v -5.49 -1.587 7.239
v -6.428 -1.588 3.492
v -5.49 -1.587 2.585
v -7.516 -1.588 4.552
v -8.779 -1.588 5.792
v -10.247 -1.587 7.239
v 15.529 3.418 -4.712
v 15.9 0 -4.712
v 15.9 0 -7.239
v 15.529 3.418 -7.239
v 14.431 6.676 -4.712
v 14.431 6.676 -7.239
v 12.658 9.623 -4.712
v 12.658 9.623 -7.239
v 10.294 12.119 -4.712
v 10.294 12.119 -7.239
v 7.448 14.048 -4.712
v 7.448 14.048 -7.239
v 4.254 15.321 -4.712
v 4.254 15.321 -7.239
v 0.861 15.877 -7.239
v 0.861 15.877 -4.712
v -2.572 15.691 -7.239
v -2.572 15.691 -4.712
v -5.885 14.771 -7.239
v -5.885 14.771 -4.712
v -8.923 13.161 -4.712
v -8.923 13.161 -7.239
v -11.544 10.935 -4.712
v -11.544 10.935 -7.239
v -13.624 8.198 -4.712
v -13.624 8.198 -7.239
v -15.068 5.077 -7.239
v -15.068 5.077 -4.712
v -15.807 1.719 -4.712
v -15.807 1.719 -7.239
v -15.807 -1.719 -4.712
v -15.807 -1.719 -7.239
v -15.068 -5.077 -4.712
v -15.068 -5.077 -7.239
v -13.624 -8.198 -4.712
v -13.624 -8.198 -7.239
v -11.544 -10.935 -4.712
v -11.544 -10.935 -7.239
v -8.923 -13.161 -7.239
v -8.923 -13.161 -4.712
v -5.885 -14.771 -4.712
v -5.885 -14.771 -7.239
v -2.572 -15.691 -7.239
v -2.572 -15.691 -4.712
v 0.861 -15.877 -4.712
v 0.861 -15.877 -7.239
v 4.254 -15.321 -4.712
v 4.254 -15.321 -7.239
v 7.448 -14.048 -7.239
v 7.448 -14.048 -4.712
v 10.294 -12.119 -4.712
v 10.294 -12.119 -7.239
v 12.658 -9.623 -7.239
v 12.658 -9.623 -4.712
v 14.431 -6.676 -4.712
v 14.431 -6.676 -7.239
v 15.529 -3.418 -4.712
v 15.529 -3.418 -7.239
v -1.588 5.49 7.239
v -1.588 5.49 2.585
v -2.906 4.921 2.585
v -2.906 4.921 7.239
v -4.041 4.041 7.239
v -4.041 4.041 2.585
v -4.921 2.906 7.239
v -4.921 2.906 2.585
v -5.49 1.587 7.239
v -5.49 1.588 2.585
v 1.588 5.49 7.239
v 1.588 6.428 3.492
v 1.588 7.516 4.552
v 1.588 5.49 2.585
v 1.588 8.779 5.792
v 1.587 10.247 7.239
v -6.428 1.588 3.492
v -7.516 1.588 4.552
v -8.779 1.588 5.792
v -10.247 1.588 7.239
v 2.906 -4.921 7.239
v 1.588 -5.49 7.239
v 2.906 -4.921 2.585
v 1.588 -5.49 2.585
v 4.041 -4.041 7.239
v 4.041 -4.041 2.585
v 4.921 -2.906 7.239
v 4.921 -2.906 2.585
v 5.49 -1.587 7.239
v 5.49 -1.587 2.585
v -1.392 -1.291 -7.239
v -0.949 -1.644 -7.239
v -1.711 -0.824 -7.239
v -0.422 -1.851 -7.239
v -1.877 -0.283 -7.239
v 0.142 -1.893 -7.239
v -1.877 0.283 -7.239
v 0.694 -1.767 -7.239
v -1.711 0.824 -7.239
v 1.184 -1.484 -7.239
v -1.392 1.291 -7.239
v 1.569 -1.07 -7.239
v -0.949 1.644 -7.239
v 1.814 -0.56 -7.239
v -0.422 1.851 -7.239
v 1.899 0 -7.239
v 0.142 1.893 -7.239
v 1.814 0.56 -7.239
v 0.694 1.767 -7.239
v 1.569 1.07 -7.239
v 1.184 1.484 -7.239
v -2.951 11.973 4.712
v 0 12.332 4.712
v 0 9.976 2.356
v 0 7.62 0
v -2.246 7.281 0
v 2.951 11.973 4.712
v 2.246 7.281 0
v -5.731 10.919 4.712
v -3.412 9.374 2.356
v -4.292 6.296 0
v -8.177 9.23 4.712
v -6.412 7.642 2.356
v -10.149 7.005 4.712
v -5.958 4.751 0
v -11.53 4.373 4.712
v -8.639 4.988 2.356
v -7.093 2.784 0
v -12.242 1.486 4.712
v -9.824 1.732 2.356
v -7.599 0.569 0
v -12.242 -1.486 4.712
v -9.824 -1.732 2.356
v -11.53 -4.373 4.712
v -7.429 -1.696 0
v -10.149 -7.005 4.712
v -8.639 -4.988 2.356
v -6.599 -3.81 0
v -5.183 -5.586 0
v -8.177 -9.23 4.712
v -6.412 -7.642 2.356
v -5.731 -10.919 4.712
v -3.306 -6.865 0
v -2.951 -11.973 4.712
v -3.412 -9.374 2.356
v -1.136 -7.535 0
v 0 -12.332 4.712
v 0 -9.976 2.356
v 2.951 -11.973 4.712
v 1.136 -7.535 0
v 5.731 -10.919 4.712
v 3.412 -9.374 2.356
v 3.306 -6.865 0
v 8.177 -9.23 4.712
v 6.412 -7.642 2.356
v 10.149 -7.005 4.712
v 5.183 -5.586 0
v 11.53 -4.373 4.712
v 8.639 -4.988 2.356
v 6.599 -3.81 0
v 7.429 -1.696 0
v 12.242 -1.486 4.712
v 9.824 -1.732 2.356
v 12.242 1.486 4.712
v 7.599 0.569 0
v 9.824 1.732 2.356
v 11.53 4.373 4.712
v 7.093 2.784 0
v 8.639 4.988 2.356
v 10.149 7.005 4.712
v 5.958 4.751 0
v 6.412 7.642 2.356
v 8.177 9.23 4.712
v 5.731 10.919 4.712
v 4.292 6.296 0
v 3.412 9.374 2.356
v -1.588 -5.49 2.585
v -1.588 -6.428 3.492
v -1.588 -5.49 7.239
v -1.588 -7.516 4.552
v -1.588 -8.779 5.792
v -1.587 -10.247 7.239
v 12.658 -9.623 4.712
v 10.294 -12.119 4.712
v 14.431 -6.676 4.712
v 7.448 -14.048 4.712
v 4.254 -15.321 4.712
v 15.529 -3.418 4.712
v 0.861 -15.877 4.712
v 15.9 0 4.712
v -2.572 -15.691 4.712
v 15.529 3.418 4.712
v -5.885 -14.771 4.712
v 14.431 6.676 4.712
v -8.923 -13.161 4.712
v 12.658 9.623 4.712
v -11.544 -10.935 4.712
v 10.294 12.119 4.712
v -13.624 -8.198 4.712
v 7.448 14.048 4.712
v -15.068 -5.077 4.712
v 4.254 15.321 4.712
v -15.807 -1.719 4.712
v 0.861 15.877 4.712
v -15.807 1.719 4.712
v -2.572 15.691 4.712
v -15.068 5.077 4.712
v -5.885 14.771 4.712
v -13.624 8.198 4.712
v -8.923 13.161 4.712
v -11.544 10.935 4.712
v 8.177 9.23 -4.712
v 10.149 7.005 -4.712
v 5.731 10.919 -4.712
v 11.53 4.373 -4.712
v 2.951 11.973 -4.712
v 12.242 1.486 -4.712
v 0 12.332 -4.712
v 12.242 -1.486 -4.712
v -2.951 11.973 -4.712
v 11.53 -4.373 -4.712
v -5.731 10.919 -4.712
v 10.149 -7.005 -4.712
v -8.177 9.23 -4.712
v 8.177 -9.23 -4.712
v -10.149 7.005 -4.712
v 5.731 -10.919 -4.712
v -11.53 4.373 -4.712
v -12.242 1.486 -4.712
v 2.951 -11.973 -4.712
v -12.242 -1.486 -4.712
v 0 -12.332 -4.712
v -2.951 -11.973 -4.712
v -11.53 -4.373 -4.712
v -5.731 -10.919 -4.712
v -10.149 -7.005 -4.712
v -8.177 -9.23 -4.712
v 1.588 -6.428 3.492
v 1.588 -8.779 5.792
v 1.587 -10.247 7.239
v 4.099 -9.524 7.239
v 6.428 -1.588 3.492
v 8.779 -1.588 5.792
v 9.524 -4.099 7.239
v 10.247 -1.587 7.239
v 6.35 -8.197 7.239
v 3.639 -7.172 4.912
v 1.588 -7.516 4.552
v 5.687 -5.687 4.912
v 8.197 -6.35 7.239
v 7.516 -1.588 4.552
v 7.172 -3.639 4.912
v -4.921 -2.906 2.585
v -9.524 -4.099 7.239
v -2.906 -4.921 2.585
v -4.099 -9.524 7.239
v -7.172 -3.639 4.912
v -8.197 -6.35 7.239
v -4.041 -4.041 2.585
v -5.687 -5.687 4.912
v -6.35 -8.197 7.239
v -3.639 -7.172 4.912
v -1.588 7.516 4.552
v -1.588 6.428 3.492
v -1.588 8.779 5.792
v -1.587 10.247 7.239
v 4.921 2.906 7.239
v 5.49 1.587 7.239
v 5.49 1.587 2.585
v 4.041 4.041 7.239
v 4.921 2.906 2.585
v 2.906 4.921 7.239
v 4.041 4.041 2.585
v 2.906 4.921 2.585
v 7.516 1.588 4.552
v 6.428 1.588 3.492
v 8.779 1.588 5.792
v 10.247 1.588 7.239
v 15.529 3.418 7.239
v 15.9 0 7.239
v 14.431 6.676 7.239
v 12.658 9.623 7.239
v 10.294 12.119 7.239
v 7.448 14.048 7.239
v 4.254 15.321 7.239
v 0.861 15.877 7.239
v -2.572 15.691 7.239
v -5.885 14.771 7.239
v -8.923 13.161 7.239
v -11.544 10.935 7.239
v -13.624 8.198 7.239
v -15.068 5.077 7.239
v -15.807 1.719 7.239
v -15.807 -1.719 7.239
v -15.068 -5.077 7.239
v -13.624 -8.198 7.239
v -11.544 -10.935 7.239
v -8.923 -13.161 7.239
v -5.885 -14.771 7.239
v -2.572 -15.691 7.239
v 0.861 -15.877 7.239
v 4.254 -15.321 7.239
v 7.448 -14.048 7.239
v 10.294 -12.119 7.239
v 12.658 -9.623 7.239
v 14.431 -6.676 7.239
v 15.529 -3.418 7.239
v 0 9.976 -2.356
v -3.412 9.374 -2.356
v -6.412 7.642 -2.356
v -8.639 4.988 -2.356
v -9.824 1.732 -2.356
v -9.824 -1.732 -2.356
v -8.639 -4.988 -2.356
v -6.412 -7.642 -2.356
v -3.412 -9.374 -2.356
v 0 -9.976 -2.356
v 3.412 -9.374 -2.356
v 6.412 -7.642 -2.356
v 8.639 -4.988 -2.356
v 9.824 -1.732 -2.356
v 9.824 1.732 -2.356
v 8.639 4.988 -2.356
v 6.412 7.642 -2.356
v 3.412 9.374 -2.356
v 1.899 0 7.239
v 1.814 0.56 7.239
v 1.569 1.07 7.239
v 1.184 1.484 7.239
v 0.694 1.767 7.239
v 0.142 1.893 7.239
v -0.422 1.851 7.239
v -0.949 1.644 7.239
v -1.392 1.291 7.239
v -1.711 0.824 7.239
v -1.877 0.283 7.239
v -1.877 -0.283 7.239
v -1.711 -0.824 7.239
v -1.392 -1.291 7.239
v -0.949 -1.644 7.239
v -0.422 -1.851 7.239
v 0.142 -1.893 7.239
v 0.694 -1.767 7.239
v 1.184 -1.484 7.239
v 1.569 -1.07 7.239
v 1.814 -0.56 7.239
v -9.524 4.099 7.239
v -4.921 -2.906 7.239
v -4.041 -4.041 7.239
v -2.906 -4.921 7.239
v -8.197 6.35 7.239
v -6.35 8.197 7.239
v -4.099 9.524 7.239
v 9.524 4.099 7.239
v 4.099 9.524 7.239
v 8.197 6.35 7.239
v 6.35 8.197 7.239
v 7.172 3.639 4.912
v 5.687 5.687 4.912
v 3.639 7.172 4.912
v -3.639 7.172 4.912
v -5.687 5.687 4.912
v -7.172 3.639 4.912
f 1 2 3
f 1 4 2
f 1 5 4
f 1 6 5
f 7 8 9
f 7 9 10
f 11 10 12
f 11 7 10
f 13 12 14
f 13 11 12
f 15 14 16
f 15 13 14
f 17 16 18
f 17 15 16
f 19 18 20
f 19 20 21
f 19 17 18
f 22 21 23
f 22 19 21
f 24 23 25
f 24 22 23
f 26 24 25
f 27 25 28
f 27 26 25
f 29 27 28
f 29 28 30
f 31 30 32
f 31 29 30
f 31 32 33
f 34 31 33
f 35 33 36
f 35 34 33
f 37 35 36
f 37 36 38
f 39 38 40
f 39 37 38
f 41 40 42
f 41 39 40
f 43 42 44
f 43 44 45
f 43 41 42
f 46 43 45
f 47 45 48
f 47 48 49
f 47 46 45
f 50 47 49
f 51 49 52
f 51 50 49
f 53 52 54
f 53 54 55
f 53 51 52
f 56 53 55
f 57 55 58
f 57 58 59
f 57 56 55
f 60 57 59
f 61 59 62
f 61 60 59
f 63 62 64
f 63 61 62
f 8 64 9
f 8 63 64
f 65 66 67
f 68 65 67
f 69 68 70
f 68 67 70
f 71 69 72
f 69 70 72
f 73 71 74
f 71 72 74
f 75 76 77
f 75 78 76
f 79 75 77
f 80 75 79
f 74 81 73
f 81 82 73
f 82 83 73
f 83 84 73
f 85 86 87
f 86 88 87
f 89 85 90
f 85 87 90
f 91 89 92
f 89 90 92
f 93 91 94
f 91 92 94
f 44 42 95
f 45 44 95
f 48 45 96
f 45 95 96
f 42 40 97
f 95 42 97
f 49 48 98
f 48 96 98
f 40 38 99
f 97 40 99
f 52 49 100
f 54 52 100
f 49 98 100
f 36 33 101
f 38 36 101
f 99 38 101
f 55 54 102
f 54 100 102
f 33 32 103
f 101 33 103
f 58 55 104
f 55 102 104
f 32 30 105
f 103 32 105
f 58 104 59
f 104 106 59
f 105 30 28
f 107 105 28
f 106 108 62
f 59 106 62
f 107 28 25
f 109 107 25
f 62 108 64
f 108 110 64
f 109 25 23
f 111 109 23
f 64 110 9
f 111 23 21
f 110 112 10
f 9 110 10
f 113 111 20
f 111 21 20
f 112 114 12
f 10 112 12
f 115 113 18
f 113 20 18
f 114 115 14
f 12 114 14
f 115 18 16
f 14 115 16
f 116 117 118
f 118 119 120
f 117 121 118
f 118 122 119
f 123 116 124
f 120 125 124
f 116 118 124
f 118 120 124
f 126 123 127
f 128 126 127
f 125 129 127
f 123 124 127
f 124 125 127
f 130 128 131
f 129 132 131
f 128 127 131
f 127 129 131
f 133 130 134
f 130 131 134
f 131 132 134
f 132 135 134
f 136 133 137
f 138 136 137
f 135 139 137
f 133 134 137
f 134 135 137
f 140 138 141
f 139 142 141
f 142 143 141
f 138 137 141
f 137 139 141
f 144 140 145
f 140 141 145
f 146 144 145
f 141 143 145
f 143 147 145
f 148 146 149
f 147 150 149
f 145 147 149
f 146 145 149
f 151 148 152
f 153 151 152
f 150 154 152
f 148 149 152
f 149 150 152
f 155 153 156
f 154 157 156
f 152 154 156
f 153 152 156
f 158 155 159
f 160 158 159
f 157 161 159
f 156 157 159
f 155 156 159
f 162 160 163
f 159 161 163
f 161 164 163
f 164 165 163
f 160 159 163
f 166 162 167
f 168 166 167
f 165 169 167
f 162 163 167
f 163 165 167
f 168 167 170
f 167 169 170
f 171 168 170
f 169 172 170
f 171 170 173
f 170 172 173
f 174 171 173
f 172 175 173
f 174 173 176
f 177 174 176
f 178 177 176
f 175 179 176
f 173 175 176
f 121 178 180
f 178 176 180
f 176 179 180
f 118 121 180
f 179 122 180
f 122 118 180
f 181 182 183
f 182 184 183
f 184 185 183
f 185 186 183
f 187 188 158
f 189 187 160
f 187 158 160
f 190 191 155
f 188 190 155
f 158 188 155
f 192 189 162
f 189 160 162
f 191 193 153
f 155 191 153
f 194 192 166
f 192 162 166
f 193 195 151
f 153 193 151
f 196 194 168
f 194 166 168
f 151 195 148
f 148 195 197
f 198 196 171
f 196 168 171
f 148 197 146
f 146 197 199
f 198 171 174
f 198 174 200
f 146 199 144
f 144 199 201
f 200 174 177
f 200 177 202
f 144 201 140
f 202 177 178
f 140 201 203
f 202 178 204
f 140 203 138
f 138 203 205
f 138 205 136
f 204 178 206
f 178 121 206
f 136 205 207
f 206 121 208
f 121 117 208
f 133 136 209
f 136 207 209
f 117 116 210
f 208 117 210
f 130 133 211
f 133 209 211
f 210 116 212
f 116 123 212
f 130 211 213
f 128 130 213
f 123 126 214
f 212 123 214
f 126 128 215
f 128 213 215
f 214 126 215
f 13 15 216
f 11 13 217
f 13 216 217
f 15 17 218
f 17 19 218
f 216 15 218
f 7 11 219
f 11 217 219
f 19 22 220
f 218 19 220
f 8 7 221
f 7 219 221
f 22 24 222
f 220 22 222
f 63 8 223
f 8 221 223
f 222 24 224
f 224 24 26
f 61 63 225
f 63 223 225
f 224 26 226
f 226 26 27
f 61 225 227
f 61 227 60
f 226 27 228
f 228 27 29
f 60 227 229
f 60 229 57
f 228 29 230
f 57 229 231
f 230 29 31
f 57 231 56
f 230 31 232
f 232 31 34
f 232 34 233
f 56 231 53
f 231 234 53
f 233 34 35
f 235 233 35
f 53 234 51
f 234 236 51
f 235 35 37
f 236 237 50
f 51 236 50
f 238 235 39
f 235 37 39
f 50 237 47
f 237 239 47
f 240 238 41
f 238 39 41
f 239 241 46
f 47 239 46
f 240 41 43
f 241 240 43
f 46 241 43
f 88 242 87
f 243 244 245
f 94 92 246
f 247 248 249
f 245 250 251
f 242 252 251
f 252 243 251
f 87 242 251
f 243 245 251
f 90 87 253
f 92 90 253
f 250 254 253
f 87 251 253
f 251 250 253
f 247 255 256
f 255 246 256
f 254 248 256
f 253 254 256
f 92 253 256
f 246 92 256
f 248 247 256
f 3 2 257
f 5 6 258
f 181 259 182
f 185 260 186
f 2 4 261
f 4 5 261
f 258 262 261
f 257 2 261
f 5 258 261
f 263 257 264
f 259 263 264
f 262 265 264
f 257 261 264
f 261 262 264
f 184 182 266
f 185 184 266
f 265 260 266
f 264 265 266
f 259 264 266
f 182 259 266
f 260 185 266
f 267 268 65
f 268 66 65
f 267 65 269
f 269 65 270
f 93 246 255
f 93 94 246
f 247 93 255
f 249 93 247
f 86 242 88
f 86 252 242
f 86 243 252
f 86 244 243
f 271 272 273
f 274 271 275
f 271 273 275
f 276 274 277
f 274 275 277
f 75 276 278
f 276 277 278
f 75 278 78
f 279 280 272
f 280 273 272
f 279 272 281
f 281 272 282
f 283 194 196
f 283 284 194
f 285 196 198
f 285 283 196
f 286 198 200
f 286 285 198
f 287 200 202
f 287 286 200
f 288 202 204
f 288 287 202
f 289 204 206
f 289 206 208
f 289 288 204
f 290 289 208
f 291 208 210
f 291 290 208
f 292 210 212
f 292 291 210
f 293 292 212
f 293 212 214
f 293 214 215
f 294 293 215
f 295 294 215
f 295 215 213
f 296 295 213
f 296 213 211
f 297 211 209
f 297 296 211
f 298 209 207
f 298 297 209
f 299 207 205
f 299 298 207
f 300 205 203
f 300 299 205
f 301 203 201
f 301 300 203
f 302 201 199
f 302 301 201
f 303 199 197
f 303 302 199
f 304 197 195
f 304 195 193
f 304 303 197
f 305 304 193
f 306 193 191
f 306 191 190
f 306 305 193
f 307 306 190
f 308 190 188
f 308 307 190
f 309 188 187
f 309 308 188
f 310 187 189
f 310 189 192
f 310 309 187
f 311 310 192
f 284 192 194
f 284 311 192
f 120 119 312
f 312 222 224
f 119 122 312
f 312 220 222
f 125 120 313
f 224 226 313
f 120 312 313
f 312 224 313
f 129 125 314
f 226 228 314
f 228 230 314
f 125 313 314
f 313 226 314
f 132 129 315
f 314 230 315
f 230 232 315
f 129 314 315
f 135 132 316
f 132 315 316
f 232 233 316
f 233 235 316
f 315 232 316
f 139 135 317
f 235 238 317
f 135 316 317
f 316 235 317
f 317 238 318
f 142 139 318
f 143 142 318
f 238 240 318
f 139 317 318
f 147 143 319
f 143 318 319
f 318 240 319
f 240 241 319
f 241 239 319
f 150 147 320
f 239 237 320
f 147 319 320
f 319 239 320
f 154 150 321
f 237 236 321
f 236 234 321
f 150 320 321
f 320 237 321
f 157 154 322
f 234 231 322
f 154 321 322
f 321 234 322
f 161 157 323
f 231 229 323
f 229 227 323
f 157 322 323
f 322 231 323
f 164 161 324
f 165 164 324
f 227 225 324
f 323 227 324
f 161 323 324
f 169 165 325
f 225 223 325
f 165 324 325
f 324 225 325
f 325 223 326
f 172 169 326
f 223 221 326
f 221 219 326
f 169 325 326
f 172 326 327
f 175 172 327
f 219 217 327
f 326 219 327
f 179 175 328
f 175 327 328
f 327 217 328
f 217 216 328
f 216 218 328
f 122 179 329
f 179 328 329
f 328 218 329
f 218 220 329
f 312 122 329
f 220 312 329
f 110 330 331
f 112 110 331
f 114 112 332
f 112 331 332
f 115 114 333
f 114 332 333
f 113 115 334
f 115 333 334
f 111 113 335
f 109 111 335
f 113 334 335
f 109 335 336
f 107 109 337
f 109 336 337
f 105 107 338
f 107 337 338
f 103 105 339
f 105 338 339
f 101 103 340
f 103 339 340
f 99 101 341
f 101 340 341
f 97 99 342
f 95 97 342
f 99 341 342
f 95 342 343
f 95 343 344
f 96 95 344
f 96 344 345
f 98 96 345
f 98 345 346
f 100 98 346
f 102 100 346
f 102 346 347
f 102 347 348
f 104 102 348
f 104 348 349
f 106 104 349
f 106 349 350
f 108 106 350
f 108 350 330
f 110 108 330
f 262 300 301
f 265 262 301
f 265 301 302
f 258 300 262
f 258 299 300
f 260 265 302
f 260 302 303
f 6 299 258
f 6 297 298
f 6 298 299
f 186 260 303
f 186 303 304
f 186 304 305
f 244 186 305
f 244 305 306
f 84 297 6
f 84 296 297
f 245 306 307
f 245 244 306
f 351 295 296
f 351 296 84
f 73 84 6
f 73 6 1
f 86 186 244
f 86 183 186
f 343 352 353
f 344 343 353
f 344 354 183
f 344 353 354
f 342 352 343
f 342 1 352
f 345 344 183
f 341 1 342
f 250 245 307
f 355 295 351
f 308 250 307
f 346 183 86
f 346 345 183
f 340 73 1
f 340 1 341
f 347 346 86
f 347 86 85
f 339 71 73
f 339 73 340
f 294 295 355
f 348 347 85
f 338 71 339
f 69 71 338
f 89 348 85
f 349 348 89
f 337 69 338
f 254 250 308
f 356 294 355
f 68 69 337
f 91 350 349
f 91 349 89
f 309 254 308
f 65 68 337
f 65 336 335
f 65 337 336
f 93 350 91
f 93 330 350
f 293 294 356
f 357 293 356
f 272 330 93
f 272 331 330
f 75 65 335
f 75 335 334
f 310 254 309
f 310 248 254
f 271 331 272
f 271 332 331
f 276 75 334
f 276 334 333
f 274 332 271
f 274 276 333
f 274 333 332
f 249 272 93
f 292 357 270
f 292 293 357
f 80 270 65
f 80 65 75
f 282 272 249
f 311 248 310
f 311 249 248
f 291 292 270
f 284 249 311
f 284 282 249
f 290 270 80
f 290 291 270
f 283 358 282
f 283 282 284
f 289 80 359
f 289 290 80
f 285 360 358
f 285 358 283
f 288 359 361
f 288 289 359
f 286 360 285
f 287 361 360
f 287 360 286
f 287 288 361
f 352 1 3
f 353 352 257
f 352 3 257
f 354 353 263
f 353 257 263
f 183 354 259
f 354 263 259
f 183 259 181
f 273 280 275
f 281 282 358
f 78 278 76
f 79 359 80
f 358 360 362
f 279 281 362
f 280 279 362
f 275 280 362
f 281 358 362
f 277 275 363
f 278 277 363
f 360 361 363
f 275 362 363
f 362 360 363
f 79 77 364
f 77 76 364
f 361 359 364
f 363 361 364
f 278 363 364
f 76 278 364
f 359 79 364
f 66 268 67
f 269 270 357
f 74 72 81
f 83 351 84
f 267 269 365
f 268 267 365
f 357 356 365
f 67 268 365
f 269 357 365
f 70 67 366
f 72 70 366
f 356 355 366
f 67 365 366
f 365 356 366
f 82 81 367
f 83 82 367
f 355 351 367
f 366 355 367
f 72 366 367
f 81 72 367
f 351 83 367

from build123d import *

# Parameters (mm, degrees)
F0_R     = 15.9004
F1_DEPTH = 7.239
F2_R     = 1.89865
F3_DEPTH = 14.479
F6_W     = 3.175
F6_H     = 7.62
F6_W_2   = 7.62
F6_H_2   = 3.175


with BuildPart() as f1:
    # F0 (on Top) → F1 (new body, symmetric)
    with BuildSketch(Plane.XY):
        Circle(F0_R)
    extrude(amount=F1_DEPTH, both=True)

    # F2 (on face) → F3 (cut, through all)
    with BuildSketch(Plane.XY.offset(7.239)):
        Circle(F2_R)
    extrude(amount=-F3_DEPTH, mode=Mode.SUBTRACT)

    # F4 (on Right) → F5 (revolve, cut)
    with BuildSketch(Plane.YZ):
        Polygon((7.62, 0), (12.3317, -4.7117), (16.1773537484, -4.7117), (16.1773537484, 4.7117), (12.3317, 4.7117), align=None)
        Polygon((11.7093047491, 8.5794328097), (5.715, 8.5794328097), (5.715, 2.5851280605), align=None)
    revolve(axis=Axis((0, 0, 6.2945708632), (0, 0, 1)), mode=Mode.SUBTRACT)

    # F6 (on face) → F7 (join, up to the next surface of F1)
    with BuildSketch(Plane.XY.offset(7.239)):
        with Locations((0, 8.4708621725)):
            Rectangle(F6_W, F6_H)
        with Locations((-8.4708621725, 0)):
            Rectangle(F6_W_2, F6_H_2)
        with Locations((0, -8.4708621725)):
            Rectangle(F6_W, F6_H)
        with Locations((8.4708621725, 0)):
            Rectangle(F6_W_2, F6_H_2)
    extrude(until=Until.NEXT, dir=(0, 0, -1))


solid = f1.part
